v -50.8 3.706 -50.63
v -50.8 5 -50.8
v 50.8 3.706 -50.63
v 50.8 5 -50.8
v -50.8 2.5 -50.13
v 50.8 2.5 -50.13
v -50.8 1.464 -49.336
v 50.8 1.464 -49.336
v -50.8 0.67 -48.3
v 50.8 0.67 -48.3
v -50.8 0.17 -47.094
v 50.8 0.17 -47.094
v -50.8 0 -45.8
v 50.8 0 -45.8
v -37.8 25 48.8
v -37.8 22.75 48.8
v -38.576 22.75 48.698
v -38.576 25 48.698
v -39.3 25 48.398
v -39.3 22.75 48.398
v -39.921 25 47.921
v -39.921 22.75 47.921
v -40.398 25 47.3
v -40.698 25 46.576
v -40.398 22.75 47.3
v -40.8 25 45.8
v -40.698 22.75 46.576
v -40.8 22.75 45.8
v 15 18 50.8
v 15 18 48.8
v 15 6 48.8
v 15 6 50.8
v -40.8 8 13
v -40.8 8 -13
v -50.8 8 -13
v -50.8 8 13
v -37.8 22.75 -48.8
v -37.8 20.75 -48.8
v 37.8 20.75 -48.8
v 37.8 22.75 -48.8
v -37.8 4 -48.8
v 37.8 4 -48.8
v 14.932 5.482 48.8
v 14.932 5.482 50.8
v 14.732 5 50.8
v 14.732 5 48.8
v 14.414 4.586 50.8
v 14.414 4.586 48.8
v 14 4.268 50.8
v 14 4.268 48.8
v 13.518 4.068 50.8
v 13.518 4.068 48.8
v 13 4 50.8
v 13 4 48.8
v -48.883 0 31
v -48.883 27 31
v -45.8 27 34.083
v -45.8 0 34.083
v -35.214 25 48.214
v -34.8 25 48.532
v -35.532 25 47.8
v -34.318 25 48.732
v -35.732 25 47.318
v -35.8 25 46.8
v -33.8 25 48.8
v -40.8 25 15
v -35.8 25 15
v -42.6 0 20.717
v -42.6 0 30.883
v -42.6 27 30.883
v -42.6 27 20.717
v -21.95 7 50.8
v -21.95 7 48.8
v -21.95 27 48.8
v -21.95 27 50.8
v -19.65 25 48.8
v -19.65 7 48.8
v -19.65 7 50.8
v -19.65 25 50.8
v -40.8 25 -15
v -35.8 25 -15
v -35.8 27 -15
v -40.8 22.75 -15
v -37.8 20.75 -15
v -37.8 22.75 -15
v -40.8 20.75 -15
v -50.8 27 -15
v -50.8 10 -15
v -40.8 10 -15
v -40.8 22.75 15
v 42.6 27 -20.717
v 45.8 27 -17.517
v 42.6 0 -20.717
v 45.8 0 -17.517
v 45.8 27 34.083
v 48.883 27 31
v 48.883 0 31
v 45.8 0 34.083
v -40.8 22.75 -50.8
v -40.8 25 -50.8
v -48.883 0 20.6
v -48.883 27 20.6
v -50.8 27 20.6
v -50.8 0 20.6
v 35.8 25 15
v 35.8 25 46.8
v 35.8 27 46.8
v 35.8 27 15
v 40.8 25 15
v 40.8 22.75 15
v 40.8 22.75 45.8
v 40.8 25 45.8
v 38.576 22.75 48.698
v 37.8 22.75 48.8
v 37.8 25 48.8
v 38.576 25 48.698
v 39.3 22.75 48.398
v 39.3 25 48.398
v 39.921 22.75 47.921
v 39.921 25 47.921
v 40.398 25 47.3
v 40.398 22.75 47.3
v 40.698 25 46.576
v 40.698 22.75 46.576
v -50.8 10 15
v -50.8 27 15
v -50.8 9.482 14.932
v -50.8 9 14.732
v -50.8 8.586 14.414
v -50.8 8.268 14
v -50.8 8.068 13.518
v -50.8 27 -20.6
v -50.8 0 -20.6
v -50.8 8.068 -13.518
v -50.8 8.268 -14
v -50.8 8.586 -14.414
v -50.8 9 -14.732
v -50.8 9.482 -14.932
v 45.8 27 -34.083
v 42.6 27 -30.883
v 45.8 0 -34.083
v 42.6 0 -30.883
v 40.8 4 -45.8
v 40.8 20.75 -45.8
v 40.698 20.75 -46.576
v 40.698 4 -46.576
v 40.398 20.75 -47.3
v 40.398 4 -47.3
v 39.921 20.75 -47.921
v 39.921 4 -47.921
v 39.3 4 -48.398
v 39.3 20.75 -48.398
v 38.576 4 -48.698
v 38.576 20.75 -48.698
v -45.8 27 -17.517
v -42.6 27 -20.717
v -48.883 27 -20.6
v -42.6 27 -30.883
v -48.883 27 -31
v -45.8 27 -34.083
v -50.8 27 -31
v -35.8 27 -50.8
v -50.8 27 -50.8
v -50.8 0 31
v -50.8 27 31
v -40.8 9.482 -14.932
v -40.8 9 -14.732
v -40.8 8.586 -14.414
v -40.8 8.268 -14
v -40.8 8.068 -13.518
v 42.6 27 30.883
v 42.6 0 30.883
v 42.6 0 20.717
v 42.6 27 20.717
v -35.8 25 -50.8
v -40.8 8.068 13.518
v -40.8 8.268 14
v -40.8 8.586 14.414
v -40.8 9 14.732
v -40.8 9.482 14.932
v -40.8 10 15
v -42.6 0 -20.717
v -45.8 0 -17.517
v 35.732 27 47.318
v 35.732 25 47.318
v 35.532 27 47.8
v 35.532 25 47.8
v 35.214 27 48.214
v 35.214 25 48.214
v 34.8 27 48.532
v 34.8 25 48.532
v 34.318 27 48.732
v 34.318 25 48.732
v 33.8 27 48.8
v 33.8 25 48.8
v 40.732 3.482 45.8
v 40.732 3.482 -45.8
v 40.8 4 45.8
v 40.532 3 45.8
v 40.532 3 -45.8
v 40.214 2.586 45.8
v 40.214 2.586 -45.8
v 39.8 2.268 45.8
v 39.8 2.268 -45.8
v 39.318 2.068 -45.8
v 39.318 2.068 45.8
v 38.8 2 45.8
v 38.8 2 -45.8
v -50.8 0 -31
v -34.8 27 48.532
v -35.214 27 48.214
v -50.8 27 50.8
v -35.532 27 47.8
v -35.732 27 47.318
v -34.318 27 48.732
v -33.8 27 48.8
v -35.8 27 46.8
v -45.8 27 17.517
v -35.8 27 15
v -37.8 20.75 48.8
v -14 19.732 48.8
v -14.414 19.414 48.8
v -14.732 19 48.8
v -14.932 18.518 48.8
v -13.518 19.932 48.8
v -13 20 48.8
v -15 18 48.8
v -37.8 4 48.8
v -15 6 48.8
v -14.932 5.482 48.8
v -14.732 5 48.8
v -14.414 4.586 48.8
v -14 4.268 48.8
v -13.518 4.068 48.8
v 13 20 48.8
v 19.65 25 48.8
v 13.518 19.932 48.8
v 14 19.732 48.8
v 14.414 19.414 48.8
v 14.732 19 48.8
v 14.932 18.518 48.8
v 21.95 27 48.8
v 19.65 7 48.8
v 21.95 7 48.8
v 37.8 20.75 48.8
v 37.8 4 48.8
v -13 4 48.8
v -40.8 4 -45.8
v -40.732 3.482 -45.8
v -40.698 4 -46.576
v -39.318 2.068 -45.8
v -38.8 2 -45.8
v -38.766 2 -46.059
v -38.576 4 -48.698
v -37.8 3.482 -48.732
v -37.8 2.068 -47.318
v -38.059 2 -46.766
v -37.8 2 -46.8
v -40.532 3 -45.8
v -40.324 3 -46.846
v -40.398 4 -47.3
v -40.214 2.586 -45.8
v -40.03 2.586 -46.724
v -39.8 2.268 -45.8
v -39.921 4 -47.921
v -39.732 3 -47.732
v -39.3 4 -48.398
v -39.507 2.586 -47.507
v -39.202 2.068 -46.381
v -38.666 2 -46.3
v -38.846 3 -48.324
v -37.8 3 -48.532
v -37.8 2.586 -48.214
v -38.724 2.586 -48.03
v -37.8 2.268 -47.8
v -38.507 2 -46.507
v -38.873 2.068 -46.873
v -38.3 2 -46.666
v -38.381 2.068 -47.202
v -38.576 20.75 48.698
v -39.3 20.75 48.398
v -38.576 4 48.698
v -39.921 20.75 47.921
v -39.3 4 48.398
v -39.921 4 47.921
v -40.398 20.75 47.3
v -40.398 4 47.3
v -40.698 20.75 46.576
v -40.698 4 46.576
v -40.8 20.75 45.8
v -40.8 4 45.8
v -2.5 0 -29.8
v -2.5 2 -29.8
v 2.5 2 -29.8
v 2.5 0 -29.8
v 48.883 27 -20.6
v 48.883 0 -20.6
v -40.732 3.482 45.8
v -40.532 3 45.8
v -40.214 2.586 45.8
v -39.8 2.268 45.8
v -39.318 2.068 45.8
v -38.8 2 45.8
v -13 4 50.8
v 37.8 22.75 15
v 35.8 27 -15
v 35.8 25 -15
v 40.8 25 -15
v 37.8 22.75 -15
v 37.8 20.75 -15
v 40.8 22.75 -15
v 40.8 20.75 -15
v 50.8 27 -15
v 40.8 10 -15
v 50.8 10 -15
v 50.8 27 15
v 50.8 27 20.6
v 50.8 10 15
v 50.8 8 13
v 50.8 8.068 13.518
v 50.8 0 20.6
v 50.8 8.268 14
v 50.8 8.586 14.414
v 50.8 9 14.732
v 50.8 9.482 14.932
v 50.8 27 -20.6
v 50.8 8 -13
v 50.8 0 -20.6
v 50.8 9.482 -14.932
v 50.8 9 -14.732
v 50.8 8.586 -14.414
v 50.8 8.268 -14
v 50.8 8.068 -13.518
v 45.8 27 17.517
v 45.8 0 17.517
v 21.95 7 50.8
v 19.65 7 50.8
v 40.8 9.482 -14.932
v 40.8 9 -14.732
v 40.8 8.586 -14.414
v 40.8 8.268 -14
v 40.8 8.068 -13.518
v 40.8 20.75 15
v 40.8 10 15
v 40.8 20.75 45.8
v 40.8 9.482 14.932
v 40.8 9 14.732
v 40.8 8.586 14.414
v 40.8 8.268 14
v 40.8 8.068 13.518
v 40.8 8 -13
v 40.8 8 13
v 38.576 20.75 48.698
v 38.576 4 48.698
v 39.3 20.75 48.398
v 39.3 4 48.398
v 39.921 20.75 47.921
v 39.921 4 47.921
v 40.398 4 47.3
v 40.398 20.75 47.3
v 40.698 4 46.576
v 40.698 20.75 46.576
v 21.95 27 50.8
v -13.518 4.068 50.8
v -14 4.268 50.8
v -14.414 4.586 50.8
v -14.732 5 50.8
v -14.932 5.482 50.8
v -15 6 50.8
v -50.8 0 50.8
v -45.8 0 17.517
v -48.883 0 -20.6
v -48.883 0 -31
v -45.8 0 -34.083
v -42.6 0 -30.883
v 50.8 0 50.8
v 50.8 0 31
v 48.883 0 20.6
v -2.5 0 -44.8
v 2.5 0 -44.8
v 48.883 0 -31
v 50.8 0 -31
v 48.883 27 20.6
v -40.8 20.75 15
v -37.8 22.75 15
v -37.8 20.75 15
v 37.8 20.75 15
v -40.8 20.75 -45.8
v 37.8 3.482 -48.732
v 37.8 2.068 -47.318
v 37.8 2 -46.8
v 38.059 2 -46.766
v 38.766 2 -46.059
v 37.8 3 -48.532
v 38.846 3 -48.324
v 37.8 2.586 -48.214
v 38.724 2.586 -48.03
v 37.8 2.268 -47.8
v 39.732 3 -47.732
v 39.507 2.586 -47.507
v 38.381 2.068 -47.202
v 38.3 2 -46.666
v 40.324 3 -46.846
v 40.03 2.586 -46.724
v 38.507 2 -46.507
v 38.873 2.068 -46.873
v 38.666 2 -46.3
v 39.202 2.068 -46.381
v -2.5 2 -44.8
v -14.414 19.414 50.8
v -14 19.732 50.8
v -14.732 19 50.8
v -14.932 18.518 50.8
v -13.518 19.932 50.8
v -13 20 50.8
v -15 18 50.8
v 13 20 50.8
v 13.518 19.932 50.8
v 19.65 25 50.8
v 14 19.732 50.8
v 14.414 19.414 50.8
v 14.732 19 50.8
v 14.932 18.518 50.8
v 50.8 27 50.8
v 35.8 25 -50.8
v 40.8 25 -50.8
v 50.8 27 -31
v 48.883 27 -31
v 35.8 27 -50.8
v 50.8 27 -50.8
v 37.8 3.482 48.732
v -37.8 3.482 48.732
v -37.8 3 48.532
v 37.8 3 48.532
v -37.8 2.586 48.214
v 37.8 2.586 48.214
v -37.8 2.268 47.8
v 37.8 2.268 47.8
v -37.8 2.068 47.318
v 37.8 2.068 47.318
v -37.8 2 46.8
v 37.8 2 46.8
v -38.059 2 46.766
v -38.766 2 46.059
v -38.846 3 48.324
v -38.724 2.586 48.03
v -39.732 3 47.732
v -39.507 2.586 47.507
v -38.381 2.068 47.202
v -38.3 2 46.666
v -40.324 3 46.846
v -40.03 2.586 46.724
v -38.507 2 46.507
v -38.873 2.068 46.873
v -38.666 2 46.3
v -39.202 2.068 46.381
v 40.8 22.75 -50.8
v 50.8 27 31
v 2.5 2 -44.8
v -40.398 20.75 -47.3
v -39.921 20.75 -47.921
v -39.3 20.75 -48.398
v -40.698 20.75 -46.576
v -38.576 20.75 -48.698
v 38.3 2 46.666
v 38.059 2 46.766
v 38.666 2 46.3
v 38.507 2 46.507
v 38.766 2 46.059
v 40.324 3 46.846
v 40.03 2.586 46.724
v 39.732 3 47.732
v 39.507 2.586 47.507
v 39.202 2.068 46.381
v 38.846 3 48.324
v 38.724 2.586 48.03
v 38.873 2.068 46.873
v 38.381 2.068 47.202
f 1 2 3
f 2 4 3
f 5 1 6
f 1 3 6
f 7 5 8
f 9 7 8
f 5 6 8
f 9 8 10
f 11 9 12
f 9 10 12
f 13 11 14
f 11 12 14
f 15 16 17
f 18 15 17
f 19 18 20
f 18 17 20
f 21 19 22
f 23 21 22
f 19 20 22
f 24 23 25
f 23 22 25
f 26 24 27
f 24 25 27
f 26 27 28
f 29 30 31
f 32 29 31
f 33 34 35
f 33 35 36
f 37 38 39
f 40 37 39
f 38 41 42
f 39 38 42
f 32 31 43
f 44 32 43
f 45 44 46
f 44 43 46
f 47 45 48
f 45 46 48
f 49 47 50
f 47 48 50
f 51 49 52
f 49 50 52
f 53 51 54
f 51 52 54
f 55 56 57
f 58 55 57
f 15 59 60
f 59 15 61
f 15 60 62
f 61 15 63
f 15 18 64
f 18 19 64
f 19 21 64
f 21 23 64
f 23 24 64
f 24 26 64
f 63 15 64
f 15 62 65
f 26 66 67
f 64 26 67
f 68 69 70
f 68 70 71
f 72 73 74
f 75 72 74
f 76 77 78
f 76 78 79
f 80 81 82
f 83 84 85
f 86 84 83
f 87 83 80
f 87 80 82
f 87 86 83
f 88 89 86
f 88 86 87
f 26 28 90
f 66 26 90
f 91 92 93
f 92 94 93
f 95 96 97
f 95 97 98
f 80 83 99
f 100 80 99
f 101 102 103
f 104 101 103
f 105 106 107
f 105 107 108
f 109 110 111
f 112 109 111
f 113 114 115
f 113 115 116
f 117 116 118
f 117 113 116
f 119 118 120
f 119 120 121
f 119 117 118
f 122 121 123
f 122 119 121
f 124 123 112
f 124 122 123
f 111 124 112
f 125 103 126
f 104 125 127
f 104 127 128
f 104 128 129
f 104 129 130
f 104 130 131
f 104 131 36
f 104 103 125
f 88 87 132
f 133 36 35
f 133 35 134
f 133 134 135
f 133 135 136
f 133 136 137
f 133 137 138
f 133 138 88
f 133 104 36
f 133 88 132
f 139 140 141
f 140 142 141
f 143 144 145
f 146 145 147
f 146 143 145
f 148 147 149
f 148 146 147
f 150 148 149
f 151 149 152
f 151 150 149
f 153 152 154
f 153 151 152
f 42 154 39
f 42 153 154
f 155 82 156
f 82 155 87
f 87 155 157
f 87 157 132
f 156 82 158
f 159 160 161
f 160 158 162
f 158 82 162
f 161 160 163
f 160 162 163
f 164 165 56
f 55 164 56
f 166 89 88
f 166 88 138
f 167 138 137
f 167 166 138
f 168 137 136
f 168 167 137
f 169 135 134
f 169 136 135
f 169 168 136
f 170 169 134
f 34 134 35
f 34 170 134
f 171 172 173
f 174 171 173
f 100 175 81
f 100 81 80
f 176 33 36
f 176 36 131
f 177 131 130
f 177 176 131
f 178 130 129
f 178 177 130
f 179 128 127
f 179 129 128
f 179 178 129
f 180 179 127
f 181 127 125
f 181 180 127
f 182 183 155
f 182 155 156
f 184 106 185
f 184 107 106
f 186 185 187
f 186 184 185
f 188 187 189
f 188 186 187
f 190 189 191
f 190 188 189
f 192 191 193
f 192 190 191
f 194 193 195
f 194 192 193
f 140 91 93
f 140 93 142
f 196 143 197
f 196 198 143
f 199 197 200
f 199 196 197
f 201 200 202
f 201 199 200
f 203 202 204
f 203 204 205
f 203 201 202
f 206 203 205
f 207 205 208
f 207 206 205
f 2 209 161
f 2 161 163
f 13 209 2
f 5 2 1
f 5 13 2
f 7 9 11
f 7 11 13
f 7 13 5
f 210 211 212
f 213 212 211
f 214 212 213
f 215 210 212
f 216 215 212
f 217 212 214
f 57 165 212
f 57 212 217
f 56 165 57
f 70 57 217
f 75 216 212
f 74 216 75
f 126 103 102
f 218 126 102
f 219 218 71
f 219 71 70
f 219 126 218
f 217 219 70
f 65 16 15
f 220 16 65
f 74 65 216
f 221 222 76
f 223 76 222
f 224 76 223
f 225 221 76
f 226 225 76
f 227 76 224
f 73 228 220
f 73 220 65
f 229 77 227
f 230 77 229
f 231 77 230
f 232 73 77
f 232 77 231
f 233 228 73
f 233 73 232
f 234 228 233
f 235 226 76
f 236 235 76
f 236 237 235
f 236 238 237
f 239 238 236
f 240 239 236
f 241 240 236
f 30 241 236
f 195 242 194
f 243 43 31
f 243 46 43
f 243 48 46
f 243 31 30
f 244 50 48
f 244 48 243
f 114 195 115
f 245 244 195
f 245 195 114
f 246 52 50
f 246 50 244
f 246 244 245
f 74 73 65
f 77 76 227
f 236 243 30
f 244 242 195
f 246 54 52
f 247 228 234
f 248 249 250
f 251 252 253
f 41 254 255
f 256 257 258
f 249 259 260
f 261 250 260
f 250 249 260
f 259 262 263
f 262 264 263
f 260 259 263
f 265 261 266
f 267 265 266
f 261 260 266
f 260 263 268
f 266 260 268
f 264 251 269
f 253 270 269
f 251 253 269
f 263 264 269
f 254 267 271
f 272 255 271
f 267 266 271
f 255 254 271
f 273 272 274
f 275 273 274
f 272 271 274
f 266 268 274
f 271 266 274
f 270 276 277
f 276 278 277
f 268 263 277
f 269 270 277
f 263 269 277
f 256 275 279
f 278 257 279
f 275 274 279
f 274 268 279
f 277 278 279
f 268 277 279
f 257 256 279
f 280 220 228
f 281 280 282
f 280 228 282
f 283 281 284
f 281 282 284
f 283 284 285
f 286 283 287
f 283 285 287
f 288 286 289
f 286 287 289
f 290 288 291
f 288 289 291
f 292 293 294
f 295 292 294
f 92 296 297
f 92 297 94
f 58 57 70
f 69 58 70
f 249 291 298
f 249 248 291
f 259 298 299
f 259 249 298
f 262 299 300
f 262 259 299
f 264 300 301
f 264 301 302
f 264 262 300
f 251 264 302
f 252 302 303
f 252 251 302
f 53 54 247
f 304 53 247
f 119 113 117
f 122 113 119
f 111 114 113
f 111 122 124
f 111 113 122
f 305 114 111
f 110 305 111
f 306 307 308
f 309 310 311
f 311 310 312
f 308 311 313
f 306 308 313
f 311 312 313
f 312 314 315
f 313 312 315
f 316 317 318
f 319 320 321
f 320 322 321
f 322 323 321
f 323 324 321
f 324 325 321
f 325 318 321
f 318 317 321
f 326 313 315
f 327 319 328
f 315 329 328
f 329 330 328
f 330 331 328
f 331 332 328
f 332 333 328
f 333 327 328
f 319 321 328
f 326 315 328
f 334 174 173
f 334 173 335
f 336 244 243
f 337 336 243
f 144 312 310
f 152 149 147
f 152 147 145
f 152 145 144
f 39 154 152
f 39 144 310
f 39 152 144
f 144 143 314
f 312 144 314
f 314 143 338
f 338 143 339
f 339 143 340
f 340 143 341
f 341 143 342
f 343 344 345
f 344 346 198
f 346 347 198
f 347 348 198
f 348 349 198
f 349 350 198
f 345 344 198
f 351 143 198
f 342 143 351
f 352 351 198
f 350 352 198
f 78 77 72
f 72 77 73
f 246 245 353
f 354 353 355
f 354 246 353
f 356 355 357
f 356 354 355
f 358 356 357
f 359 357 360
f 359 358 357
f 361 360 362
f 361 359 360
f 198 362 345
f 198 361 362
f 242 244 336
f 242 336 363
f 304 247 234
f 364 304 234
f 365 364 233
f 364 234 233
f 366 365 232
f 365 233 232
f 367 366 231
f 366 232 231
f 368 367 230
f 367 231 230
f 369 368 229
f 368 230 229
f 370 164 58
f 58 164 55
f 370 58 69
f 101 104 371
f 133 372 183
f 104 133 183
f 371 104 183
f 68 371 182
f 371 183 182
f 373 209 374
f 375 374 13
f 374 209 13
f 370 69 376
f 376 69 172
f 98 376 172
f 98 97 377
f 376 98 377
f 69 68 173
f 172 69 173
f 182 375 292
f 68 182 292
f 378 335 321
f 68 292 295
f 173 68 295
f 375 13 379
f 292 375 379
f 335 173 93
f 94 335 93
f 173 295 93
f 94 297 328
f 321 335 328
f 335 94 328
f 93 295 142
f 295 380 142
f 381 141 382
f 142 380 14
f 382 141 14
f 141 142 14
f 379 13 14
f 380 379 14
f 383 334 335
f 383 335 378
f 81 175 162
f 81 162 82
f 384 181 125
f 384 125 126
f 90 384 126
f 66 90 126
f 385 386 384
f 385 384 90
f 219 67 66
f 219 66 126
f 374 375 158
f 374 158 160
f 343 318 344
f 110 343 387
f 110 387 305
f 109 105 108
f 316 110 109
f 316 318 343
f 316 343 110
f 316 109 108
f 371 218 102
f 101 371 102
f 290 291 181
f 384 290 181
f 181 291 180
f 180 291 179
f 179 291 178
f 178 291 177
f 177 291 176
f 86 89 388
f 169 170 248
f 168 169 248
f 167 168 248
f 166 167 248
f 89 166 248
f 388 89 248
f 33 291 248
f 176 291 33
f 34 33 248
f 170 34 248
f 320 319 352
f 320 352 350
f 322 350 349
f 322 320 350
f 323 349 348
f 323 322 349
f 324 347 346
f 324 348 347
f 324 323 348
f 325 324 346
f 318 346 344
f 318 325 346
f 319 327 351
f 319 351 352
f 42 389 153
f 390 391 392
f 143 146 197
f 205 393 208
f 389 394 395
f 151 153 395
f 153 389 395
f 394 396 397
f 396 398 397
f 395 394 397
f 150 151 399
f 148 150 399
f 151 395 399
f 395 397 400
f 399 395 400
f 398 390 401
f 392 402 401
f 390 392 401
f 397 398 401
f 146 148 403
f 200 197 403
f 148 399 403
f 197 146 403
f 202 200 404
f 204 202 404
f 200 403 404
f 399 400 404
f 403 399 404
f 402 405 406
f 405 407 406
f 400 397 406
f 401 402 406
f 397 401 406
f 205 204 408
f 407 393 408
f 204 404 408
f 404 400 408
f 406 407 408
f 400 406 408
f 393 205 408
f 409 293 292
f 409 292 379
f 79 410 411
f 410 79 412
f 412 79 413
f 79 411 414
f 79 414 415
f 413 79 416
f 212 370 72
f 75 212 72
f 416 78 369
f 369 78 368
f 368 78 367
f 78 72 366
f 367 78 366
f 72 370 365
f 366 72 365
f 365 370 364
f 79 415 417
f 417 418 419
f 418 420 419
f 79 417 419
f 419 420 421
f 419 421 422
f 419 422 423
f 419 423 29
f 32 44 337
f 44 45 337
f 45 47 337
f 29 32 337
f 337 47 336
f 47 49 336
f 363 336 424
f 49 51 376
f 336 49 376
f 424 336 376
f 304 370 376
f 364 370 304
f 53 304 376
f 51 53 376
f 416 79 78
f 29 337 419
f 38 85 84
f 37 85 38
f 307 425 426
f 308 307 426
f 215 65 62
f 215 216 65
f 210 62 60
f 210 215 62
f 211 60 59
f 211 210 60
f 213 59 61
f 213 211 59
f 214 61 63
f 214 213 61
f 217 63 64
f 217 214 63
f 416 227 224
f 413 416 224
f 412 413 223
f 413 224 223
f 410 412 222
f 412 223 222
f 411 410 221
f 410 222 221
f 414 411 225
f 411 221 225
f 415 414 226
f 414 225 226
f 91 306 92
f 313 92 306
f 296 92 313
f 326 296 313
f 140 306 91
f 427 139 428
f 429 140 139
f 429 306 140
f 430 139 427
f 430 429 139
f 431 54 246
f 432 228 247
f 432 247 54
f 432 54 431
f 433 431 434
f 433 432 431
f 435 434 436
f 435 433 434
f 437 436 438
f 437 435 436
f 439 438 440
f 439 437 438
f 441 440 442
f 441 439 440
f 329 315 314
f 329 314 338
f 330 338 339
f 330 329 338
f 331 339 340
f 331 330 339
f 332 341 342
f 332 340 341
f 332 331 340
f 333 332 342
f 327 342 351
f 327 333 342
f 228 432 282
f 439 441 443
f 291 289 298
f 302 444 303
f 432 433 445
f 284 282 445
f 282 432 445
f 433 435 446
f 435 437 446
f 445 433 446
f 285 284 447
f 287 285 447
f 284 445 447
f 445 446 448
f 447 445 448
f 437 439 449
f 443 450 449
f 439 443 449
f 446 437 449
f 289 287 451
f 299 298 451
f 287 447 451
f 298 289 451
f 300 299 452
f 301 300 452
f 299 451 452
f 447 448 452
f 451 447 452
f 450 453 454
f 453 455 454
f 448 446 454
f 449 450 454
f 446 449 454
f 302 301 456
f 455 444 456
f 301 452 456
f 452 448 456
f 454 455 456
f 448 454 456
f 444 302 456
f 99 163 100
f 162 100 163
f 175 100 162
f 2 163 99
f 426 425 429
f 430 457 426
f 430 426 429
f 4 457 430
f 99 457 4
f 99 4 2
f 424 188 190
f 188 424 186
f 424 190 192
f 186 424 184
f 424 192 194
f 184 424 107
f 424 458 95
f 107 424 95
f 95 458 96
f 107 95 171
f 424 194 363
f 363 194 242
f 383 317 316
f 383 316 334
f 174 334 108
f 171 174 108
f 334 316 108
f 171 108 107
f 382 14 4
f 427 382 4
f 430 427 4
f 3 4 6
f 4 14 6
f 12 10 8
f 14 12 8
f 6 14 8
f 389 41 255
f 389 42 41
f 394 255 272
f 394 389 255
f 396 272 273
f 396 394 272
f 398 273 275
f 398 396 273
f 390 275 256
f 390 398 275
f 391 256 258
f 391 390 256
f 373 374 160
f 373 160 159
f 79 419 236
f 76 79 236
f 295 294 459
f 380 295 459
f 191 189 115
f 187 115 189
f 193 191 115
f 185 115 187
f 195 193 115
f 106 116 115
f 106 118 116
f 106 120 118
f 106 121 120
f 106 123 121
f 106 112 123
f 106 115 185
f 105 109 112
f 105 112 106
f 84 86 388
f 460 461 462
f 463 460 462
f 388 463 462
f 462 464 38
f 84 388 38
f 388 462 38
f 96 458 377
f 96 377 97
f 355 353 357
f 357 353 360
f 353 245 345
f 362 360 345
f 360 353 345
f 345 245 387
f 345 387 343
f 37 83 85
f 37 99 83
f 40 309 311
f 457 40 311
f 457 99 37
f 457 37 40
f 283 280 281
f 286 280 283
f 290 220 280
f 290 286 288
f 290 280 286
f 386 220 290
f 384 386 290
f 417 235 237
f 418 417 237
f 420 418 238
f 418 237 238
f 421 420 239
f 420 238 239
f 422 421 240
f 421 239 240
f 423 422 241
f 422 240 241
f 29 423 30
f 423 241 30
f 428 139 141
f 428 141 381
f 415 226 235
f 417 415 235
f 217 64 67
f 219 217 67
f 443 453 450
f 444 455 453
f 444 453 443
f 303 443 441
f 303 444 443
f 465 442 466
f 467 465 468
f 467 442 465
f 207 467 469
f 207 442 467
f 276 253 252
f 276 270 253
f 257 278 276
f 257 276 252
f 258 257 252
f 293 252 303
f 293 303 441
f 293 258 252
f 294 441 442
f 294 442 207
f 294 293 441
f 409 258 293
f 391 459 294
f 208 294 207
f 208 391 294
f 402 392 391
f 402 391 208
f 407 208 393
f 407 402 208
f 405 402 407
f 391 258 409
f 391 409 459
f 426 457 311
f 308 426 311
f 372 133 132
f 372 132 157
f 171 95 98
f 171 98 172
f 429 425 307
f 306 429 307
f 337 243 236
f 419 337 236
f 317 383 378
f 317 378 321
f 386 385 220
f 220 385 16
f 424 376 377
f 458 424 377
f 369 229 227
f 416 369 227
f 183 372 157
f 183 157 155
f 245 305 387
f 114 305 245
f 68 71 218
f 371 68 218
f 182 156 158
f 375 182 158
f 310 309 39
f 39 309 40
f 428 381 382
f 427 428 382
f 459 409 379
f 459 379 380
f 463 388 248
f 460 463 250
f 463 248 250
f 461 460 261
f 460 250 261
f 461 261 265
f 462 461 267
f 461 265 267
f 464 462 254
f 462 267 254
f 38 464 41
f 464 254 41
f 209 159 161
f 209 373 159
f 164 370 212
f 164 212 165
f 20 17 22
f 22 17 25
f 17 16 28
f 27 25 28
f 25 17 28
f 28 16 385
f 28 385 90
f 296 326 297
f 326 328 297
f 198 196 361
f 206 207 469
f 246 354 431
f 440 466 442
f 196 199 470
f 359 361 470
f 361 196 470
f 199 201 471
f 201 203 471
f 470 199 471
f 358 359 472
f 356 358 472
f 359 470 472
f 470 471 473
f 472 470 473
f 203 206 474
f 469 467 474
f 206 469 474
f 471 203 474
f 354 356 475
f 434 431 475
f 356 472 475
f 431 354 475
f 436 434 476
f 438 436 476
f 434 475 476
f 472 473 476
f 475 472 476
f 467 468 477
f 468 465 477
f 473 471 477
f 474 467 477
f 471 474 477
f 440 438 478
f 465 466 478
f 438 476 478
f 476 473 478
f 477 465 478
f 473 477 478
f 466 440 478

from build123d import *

# Parameters (mm, degrees)
SKETCH1_W                 = 101.6
SKETCH1_H                 = 101.6
BOSS_EXTRUDE1_DEPTH       = 25
SHELL1_T                  = -2
SHELL1_THICKNESS_2_FACE_W = 97.6
SHELL1_THICKNESS_2_FACE_H = 23
SHELL1_THICKNESS_2_DEPTH  = 8
SHELL1_THICKNESS_3_FACE_W = 97.6
SHELL1_THICKNESS_3_FACE_H = 23
SHELL1_THICKNESS_3_DEPTH  = 8
SKETCH2_W                 = 5
SKETCH2_H                 = 15
CUT_EXTRUDE1_DEPTH        = 25
CUT_EXTRUDE2_DEPTH        = 117.310790557
FILLET2_R                 = 3
FILLET3_R                 = 2
CUT_EXTRUDE4_DEPTH        = 77.067601513
CUT_EXTRUDE7_START        = -99.6
SKETCH11_W                = 2.3
SKETCH11_H                = 18
CUT_EXTRUDE7_DEPTH        = 17.710790557
SKETCH12_W                = 81.6
SKETCH12_H                = 2.25
CUT_EXTRUDE8_DEPTH        = 10
BOSS_EXTRUDE2_DEPTH       = 2
BOSS_EXTRUDE3_DEPTH       = 2
FILLET4_R                 = 2
FILLET4_OF_MIRROR1_R      = 2
FILLET5_R                 = 5


with BuildPart() as part:
    # Sketch1 → Boss-Extrude1 (new body)
    with BuildSketch(Plane(origin=(0, 0, 0), x_dir=(1, 0, 0), z_dir=(0, 1, 0))):
        Rectangle(SKETCH1_W, SKETCH1_H)
    extrude(amount=BOSS_EXTRUDE1_DEPTH)

    # Shell1
    shell1_openings = [part.faces().sort_by_distance(p)[0] for p in [
        (0, 25, 0),
    ]]
    offset(amount=SHELL1_T, openings=shell1_openings, kind=Kind.INTERSECTION)

    # Shell1 thickness 2 face (on inner face of the shell) → Shell1 thickness 2 (add)
    with BuildSketch(Plane(origin=(48.8, 13.5, 0), x_dir=(0, 0, 1), z_dir=(1, 0, 0))):
        Rectangle(SHELL1_THICKNESS_2_FACE_W, SHELL1_THICKNESS_2_FACE_H)
    extrude(amount=-SHELL1_THICKNESS_2_DEPTH)

    # Shell1 thickness 3 face (on inner face of the shell) → Shell1 thickness 3 (add)
    with BuildSketch(Plane(origin=(-48.8, 13.5, 0), x_dir=(0, 0, -1), z_dir=(-1, 0, 0))):
        Rectangle(SHELL1_THICKNESS_3_FACE_W, SHELL1_THICKNESS_3_FACE_H)
    extrude(amount=-SHELL1_THICKNESS_3_DEPTH)

    # Sketch2 → Cut-Extrude1 (cut)
    with BuildSketch(Plane(origin=(0, 2, 0), x_dir=(1, 0, 0), z_dir=(0, 1, 0))):
        with Locations((0, 37.3)):
            Rectangle(SKETCH2_W, SKETCH2_H)
    extrude(amount=-CUT_EXTRUDE1_DEPTH, mode=Mode.SUBTRACT)

    # Sketch3 → Cut-Extrude2 (cut, through all)
    with BuildSketch(Plane(origin=(50.8, 0, 0), x_dir=(0, 0, -1), z_dir=(1, 0, 0))):
        with BuildLine():
            Line((-15, 42), (15, 42))
            Line((15, 42), (15, 10))
            ThreePointArc((15, 10), (14.414213562, 8.585786438), (13, 8))
            Line((13, 8), (-13, 8))
            ThreePointArc((-13, 8), (-14.414213562, 8.585786438), (-15, 10))
            Line((-15, 10), (-15, 42))
        make_face()
    extrude(amount=-CUT_EXTRUDE2_DEPTH, mode=Mode.SUBTRACT)

    # Fillet2
    fillet2_edges = [part.edges().sort_by_distance(p)[0] for p in [
        (-40.8, 13.5, -48.8),
        (-40.8, 13.5, 48.8),
        (40.8, 13.5, 48.8),
        (40.8, 13.5, -48.8),
    ]]
    fillet(fillet2_edges, radius=FILLET2_R)

    # Fillet3
    fillet3_edges = [part.edges().sort_by_distance(p)[0] for p in [
        (40.8, 2, 0),
        (-40.8, 2, 0),
        (0, 2, 48.8),
        (0, 2, -48.8),
        (-39.921320344, 2, -47.921320344),
        (-39.921320344, 2, 47.921320344),
        (39.921320344, 2, 47.921320344),
        (39.921320344, 2, -47.921320344),
    ]]
    fillet(fillet3_edges, radius=FILLET3_R)

    # Sketch7 → Cut-Extrude4 (cut, through all)
    with BuildSketch(Plane(origin=(0, 25, 0), x_dir=(1, 0, 0), z_dir=(0, 1, 0))):
        Polygon((51, -31), (48.882842712, -31), (45.8, -34.082842712), (42.6, -30.882842712), (42.6, -20.717157288), (45.8, -17.517157288), (48.882842712, -20.6), (51, -20.6), align=None)
        Polygon((-51, -20.6), (-51, -31), (-48.882842712, -31), (-45.8, -34.082842712), (-42.6, -30.882842712), (-42.6, -20.717157288), (-45.8, -17.517157288), (-48.882842712, -20.6), align=None)
        Polygon((-51, 31), (-48.882842712, 31), (-45.8, 34.082842712), (-42.6, 30.882842712), (-42.6, 20.717157288), (-45.8, 17.517157288), (-48.882842712, 20.6), (-51, 20.6), align=None)
        Polygon((51, 20.6), (51, 31), (48.882842712, 31), (45.8, 34.082842712), (42.6, 30.882842712), (42.6, 20.717157288), (45.8, 17.517157288), (48.882842712, 20.6), align=None)
    extrude(amount=-CUT_EXTRUDE4_DEPTH, mode=Mode.SUBTRACT)

    # Sketch11 → Cut-Extrude7 (cut, through all)
    with BuildSketch(Plane(origin=(0, 0, -50.8), x_dir=(-1, 0, 0), z_dir=(0, 0, -1)).offset(CUT_EXTRUDE7_START)):
        with Locations((-20.8, 16)):
            Rectangle(SKETCH11_W, SKETCH11_H)
        with Locations((20.8, 16)):
            Rectangle(SKETCH11_W, SKETCH11_H)
        with BuildLine():
            Line((-13, 4), (13, 4))
            ThreePointArc((13, 4), (14.414213562, 4.585786438), (15, 6))
            Line((15, 6), (15, 18))
            ThreePointArc((15, 18), (14.414213562, 19.414213562), (13, 20))
            Line((13, 20), (-13, 20))
            ThreePointArc((-13, 20), (-14.414213562, 19.414213562), (-15, 18))
            Line((-15, 18), (-15, 6))
            ThreePointArc((-15, 6), (-14.414213562, 4.585786438), (-13, 4))
        make_face()
    extrude(amount=-CUT_EXTRUDE7_DEPTH, mode=Mode.SUBTRACT)

    # Sketch12 → Cut-Extrude8 (cut)
    with BuildSketch(Plane(origin=(0, 0, -50.8), x_dir=(-1, 0, 0), z_dir=(0, 0, -1))):
        with Locations((0, 23.875)):
            Rectangle(SKETCH12_W, SKETCH12_H)
    extrude(amount=-CUT_EXTRUDE8_DEPTH, mode=Mode.SUBTRACT)

    # Sketch13 → Boss-Extrude2 (add)
    with BuildSketch(Plane(origin=(0, 22.75, 0), x_dir=(1, 0, 0), z_dir=(0, 1, 0))):
        with BuildLine():
            Line((40.8, 45.8), (40.8, 15))
            Line((40.8, 15), (37.8, 15))
            Line((37.8, 15), (37.8, 48.8))
            ThreePointArc((37.8, 48.8), (39.921320344, 47.921320344), (40.8, 45.8))
        make_face()
        with BuildLine():
            Line((40.8, -45.8), (40.8, -15))
            Line((40.8, -15), (37.8, -15))
            Line((37.8, -15), (37.8, -48.8))
            ThreePointArc((37.8, -48.8), (39.921320344, -47.921320344), (40.8, -45.8))
        make_face()
    boss_extrude2 = extrude(amount=-BOSS_EXTRUDE2_DEPTH)

    # Sketch14 → Boss-Extrude3 (add)
    with BuildSketch(Plane(origin=(0, 25, 0), x_dir=(1, 0, 0), z_dir=(0, 1, 0))):
        Polygon((50.8, 50.8), (35.8, 50.8), (35.8, 15), (50.8, 15), (50.8, 20.6), (48.882842712, 20.6), (45.8, 17.517157288), (42.6, 20.717157288), (42.6, 30.882842712), (45.8, 34.082842712), (48.882842712, 31), (50.8, 31), align=None)
        Polygon((21.95, -50.8), (21.95, -48.8), (35.8, -48.8), (35.8, -15), (50.8, -15), (50.8, -20.6), (48.882842712, -20.6), (45.8, -17.517157288), (42.6, -20.717157288), (42.6, -30.882842712), (45.8, -34.082842712), (48.882842712, -31), (50.8, -31), (50.8, -50.8), align=None)
    boss_extrude3 = extrude(amount=BOSS_EXTRUDE3_DEPTH)

    # Fillet4
    fillet4_edges = [part.edges().sort_by_distance(p)[0] for p in [
        (35.8, 26, 48.8),
    ]]
    fillet(fillet4_edges, radius=FILLET4_R)

    # Mirror1: Boss-Extrude2, Boss-Extrude3 across plane
    add(boss_extrude2.mirror(Plane(origin=(0, 0, 0), x_dir=(0, 0, 1), z_dir=(1, 0, 0))))
    add(boss_extrude3.mirror(Plane(origin=(0, 0, 0), x_dir=(0, 0, 1), z_dir=(1, 0, 0))))

    # Fillet4 of Mirror1
    fillet4_of_mirror1_edges = [part.edges().sort_by_distance(p)[0] for p in [
        (-35.8, 26, 48.8),
    ]]
    fillet(fillet4_of_mirror1_edges, radius=FILLET4_OF_MIRROR1_R)

    # Fillet5
    fillet5_edges = [part.edges().sort_by_distance(p)[0] for p in [
        (0, 0, -50.8),
    ]]
    fillet(fillet5_edges, radius=FILLET5_R)


solid = part.part
